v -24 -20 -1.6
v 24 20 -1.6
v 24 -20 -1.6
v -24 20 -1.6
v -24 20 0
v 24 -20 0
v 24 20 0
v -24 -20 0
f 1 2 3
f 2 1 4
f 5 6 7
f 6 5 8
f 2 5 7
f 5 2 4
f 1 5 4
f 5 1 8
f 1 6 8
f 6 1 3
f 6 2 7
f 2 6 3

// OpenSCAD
// file: ../p/box.scad
use <../lib.scad>
function ldraw_lib__box() = [
// 0 Box 6 (six faces)
// 0 Name: box.dat
// 0 Author: James Jessiman
// 0 !LDRAW_ORG Primitive UPDATE 2002-05
// 0 !LICENSE Licensed under CC BY 2.0 and CC BY 4.0 : see CAreadme.txt
// 
// 0 BFC CERTIFY CCW
  [0,"BFC","CERTIFY"],
  [0,"BFC","CCW"],
// 
// 0 !HISTORY 2002-08-22 [sbliss] Applied BFC
// 0 !HISTORY 2002-11-30 [PTadmin] Official Update 2002-05
// 0 !HISTORY 2007-06-24 [PTadmin] Header formatted for Contributor Agreement
// 0 !HISTORY 2008-07-01 [PTadmin] Official Update 2008-01
// 
// 
// 2 24 1 1 1 -1 1 1
  [2,24,1,1,1,-1,1,1],
// 2 24 -1 1 1 -1 1 -1
  [2,24,-1,1,1,-1,1,-1],
// 2 24 -1 1 -1 1 1 -1
  [2,24,-1,1,-1,1,1,-1],
// 2 24 1 1 -1 1 1 1
  [2,24,1,1,-1,1,1,1],
// 2 24 1 -1 1 -1 -1 1
  [2,24,1,-1,1,-1,-1,1],
// 2 24 -1 -1 1 -1 -1 -1
  [2,24,-1,-1,1,-1,-1,-1],
// 2 24 -1 -1 -1 1 -1 -1
  [2,24,-1,-1,-1,1,-1,-1],
// 2 24 1 -1 -1 1 -1 1
  [2,24,1,-1,-1,1,-1,1],
// 2 24 1 -1 1 1 1 1
  [2,24,1,-1,1,1,1,1],
// 2 24 -1 -1 1 -1 1 1
  [2,24,-1,-1,1,-1,1,1],
// 2 24 1 -1 -1 1 1 -1
  [2,24,1,-1,-1,1,1,-1],
// 2 24 -1 -1 -1 -1 1 -1
  [2,24,-1,-1,-1,-1,1,-1],
// 4 16 1 1 1 1 1 -1 -1 1 -1 -1 1 1
  [4,16,1,1,1,1,1,-1,-1,1,-1,-1,1,1],
// 4 16 -1 -1 -1 1 -1 -1 1 -1 1 -1 -1 1
  [4,16,-1,-1,-1,1,-1,-1,1,-1,1,-1,-1,1],
// 4 16 -1 -1 1 1 -1 1 1 1 1 -1 1 1
  [4,16,-1,-1,1,1,-1,1,1,1,1,-1,1,1],
// 4 16 -1 -1 -1 -1 -1 1 -1 1 1 -1 1 -1
  [4,16,-1,-1,-1,-1,-1,1,-1,1,1,-1,1,-1],
// 4 16 1 -1 -1 -1 -1 -1 -1 1 -1 1 1 -1
  [4,16,1,-1,-1,-1,-1,-1,-1,1,-1,1,1,-1],
// 4 16 1 -1 1 1 -1 -1 1 1 -1 1 1 1
  [4,16,1,-1,1,1,-1,-1,1,1,-1,1,1,1],
// 0
];
module ldraw_lib__box(step=0, col=false, unit=2/5, alt=false, line=0.2, solid=!$preview)
    makepoly(ldraw_lib__box(), step=step, col=col, unit=unit, alt=alt, line=line, solid=solid);
ldraw_lib__box(line=0.2);
// main file
use <../lib.scad>
use <../p/box.scad>
function ldraw_lib__97622() = [
// 0 ~Electric Mindstorms EV3 Buttons PCB
// 0 Name: 97622.dat
// 0 Author: Philippe Hurbain [Philo]
// 0 !LDRAW_ORG Part UPDATE 2013-02
// 0 !LICENSE Licensed under CC BY 2.0 and CC BY 4.0 : see CAreadme.txt
// 
// 0 BFC CERTIFY CCW
  [0,"BFC","CERTIFY"],
  [0,"BFC","CCW"],
// 
// 0 !HISTORY 2012-05-20 {LEGO MINDSTORMS Team} Original part shape
// 0 !HISTORY 2012-12-09 [Philo] Complete rebuild for LDraw Parts Tracker
// 0 !HISTORY 2013-12-23 [PTadmin] Official Update 2013-02
// 
// 
// 0 // Highly simplified shape.
// 
// 1 16 0 2 0 60 0 0 0 2 0 0 0 50 box.dat
  [1,16,0,2,0,60,0,0,0,2,0,0,0,50, ldraw_lib__box()],
];
module ldraw_lib__97622(step=0, col=false, unit=2/5, alt=false, line=0.2, solid=!$preview)
    makepoly(ldraw_lib__97622(), step=step, col=col, unit=unit, alt=alt, line=line, solid=solid);
ldraw_lib__97622(line=0.2);
